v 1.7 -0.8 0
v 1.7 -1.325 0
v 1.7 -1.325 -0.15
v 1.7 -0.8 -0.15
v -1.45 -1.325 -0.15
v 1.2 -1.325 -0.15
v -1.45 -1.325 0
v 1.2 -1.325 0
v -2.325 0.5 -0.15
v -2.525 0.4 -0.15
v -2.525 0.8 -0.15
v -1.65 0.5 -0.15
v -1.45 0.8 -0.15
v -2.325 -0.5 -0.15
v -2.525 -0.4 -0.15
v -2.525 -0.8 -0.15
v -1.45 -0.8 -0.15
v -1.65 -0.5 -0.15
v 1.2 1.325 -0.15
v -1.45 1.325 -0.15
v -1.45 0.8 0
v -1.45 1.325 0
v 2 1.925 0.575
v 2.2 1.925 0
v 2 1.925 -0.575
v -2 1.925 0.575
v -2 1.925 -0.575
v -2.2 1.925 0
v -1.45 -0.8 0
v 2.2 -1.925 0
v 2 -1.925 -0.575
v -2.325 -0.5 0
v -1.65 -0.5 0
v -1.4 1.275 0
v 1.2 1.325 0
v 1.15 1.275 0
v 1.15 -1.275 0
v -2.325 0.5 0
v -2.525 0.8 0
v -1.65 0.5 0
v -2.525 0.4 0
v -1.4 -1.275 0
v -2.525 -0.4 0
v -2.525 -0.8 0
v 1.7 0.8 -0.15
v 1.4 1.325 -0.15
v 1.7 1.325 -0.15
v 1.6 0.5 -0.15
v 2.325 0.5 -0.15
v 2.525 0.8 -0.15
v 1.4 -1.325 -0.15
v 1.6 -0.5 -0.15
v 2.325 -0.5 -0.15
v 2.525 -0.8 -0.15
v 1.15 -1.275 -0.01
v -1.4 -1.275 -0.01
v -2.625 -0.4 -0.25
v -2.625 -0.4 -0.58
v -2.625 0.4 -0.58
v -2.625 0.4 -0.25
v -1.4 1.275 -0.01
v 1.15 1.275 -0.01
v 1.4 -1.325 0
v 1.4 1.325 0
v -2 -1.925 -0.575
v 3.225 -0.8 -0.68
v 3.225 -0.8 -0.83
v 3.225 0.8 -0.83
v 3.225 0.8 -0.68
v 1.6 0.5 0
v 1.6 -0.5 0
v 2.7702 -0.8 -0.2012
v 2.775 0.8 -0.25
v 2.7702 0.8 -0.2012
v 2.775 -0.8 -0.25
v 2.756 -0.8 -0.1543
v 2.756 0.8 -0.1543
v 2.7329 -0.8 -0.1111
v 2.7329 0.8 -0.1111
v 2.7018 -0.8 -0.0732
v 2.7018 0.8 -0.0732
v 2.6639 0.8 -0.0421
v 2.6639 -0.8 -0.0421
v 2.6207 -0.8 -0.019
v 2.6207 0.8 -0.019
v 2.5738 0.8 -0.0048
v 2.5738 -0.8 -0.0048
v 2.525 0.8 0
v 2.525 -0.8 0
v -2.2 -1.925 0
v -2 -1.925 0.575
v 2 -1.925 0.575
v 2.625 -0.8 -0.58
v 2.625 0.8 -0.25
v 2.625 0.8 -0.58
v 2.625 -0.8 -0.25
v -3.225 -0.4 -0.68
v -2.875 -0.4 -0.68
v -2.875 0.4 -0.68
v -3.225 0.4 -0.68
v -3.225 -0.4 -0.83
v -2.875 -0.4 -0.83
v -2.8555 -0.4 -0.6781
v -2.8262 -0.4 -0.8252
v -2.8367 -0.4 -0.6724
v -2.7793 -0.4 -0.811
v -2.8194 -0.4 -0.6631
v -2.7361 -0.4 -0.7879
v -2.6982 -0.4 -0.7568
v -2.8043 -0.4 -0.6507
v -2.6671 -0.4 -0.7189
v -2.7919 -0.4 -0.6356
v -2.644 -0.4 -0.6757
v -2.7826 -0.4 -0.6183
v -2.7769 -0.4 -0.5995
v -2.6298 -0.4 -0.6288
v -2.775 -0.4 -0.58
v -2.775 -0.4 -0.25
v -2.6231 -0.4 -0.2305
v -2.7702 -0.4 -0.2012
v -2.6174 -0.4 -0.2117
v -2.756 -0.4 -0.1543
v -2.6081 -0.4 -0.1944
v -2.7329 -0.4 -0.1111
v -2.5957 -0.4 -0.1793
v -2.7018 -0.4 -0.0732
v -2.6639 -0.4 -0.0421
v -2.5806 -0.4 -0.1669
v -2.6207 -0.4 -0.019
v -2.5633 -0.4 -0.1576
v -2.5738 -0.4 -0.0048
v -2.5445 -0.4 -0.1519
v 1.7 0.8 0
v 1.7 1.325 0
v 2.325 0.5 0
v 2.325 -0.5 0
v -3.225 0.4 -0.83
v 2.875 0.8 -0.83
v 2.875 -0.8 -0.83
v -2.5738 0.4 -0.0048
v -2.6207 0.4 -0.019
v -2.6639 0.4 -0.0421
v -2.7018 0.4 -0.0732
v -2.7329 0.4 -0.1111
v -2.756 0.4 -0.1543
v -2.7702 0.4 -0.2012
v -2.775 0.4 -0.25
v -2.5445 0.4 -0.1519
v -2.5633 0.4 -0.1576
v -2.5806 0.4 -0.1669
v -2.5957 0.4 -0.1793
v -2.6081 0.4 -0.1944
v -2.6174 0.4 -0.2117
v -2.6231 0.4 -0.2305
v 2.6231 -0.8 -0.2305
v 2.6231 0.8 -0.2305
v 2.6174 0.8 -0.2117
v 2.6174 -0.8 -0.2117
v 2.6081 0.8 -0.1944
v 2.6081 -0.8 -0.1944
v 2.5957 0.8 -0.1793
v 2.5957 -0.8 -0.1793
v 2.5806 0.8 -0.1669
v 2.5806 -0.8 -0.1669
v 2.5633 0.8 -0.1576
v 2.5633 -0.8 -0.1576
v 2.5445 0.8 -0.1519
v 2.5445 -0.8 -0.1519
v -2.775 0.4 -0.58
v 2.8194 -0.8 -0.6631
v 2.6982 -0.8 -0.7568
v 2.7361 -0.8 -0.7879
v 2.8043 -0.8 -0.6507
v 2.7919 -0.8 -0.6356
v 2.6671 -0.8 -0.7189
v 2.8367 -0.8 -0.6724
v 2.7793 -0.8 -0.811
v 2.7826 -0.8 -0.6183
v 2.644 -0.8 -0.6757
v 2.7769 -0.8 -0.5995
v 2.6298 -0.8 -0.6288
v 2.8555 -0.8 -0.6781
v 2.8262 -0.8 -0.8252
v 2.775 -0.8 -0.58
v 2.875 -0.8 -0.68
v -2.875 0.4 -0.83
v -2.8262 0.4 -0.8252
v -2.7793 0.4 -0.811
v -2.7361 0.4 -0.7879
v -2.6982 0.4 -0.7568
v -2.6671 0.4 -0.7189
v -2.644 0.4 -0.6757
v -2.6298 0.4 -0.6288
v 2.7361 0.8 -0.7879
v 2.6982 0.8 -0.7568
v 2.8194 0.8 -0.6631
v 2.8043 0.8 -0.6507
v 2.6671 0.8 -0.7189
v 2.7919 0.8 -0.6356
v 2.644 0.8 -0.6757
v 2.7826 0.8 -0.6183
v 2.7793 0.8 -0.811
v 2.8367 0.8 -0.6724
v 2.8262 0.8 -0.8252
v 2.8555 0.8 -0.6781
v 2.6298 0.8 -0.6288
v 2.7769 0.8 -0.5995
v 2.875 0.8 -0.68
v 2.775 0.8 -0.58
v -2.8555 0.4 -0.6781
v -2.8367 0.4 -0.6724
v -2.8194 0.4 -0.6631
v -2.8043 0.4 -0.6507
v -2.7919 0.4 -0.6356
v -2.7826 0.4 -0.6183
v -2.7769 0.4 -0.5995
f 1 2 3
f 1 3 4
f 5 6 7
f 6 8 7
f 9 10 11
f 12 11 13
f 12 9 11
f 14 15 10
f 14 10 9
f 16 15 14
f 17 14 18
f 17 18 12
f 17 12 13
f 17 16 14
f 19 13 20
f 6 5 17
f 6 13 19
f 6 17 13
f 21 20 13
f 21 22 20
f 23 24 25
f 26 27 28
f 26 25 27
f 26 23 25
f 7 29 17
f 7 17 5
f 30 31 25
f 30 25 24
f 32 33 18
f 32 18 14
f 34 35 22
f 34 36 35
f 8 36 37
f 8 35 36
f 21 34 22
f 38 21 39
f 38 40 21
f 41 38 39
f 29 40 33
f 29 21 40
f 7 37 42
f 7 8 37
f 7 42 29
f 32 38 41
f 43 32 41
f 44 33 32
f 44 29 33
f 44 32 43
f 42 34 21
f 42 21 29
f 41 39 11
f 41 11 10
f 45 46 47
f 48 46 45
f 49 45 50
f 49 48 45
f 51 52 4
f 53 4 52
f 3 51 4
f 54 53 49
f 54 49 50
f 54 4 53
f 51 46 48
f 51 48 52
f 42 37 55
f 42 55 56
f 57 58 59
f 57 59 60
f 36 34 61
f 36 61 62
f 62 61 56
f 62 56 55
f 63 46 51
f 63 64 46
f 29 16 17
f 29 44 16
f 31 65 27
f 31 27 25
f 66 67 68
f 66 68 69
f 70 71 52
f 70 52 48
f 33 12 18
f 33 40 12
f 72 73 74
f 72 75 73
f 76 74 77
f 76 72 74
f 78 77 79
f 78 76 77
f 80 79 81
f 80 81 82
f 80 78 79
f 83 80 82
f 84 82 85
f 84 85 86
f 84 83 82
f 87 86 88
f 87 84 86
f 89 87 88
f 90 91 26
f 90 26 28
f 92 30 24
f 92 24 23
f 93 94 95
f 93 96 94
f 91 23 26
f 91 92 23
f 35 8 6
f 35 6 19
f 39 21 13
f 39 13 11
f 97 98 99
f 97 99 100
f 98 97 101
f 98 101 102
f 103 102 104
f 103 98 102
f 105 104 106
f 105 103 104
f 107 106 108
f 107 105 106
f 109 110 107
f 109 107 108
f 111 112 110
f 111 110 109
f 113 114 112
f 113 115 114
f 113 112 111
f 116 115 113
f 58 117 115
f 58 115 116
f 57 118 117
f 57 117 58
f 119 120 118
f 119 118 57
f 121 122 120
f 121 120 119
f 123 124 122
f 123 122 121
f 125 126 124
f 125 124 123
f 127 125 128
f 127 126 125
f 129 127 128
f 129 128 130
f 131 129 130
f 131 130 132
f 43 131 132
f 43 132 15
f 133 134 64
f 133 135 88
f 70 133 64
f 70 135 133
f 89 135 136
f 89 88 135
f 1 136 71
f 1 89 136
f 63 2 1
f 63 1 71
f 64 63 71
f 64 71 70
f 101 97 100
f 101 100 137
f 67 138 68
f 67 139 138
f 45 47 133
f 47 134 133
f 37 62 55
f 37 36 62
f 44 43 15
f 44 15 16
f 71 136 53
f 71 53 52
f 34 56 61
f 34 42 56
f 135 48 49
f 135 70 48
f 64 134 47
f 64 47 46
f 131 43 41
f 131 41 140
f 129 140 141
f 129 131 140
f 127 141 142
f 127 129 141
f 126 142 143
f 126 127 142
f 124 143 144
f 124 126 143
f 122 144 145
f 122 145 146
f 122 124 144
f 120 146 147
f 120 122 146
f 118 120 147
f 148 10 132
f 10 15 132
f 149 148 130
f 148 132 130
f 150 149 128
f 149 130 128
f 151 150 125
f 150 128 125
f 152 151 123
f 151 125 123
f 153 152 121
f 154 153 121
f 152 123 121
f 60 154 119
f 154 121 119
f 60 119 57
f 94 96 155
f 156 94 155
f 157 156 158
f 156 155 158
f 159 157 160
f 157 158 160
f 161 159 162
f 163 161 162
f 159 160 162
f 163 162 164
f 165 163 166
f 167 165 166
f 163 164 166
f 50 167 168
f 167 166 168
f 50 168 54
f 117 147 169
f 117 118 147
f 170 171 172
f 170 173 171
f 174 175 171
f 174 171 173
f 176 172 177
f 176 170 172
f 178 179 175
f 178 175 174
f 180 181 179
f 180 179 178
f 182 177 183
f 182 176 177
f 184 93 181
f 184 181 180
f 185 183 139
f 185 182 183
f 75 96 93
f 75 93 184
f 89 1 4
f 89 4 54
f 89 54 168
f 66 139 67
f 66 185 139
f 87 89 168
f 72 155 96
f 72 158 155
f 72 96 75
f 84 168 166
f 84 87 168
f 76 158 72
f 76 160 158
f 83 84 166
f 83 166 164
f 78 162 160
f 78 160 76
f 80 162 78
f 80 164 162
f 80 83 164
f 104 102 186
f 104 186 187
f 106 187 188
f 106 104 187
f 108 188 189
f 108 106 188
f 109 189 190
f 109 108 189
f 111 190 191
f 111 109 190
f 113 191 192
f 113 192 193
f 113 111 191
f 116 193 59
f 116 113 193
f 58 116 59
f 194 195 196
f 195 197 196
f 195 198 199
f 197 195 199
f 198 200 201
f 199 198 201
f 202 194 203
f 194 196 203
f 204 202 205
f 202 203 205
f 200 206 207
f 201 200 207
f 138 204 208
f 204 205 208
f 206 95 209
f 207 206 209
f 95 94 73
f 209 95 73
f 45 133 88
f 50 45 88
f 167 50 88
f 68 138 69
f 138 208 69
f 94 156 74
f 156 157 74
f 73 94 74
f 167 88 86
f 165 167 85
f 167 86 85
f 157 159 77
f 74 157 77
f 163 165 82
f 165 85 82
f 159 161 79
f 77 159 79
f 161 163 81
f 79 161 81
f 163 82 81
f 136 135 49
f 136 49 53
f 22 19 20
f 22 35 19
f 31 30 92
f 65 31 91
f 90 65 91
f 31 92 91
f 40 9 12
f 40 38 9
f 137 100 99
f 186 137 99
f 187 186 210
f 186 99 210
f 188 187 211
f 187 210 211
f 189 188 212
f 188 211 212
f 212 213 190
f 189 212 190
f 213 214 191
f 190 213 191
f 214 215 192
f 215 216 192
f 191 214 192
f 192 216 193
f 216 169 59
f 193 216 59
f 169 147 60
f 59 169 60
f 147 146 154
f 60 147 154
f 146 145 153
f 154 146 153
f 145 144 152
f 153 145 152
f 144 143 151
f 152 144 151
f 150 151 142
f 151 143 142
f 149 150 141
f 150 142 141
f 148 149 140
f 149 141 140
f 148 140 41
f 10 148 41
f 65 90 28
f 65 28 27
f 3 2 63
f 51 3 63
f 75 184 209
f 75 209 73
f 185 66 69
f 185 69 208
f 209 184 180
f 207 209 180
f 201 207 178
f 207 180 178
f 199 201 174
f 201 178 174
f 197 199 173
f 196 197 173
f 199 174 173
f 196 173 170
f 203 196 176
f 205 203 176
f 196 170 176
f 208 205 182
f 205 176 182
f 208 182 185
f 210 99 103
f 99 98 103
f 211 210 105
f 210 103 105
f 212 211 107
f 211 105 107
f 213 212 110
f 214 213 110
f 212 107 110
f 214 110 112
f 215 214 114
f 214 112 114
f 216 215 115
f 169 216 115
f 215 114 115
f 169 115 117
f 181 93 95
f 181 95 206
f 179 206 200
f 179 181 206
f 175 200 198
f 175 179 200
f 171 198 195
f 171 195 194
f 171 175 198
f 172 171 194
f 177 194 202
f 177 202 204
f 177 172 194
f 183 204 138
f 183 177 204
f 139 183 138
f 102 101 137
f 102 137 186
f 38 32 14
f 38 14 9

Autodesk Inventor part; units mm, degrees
ref_plane "YZ Plane" through (0, 0, 0) normal (1, 0, 0) x (0, 1, 0)
ref_plane "XZ Plane" through (0, 0, 0) normal (0, 1, 0) x (-1, 0, 0)
ref_plane "XY Plane" through (0, 0, 0) normal (0, 0, 1) x (1, 0, 0)
sketch "Sketch2" plane through (0, 0, 0) normal (0, 1, 0) x (-1, 0, 0)
  line L0 (3.225, -0.83) -> (2.875, -0.83)
  arc A0 (2.625, -0.58) -> (2.875, -0.83) centre (2.875, -0.58) ccw
  line L1 (2.625, -0.58) -> (2.625, -0.25)
  arc A1 (2.625, -0.25) -> (2.525, -0.15) centre (2.525, -0.25) ccw
  line L2 (2.525, -0.15) -> (-2.525, -0.15)
  arc A2 (-2.525, -0.15) -> (-2.625, -0.25) centre (-2.525, -0.25) ccw
  line L3 (-2.625, -0.25) -> (-2.625, -0.58)
  arc A3 (-2.875, -0.83) -> (-2.625, -0.58) centre (-2.875, -0.58) ccw
  line L4 (-2.875, -0.83) -> (-3.225, -0.83)
  line L5 (-3.225, -0.83) -> (-3.225, -0.68)
  line L6 (-3.225, -0.68) -> (-2.875, -0.68)
  arc A4 (-2.875, -0.68) -> (-2.775, -0.58) centre (-2.875, -0.58) ccw
  line L7 (-2.775, -0.58) -> (-2.775, -0.25)
  arc A5 (-2.525, 0) -> (-2.775, -0.25) centre (-2.525, -0.25) ccw
  line L8 (-2.525, 0) -> (2.525, 0)
  arc A6 (2.775, -0.25) -> (2.525, 0) centre (2.525, -0.25) ccw
  line L9 (2.775, -0.25) -> (2.775, -0.58)
  arc A7 (2.775, -0.58) -> (2.875, -0.68) centre (2.875, -0.58) ccw
  line L10 (2.875, -0.68) -> (3.225, -0.68)
  line L11 (3.225, -0.68) -> (3.225, -0.83)
  point P0 (0, 0)
  point P1 (0, 0)
  point P2 (0, 0)
  dimension "d5" = 0.15
  dimension "d6" = 6.45
  dimension "d7" = 0.83
  dimension "d8" = 0.1
  dimension "d9" = 0.7
extrude "Extrusion2" add sketch "Sketch2" along normal mid plane 2.65
sketch "Sketch3" plane through (-2.525, 1.325, 0) normal (0, 0, 1) x (1, 0, 0)
  line L0 (-0.35, 0) -> (-0.35, -2.65)
  line L1 (-0.7, 0) -> (-0.35, 0)
  line L2 (-0.7, 0) -> (-0.7, -2.65)
  line L3 (-0.35, -2.65) -> (-0.7, -2.65)
  line L4 (-0.25, 0) -> (-0.25, -2.65)
  line L5 (-0.35, 0) -> (-0.25, 0)
  line L6 (-0.35, 0) -> (-0.35, -2.65)
  line L7 (-0.25, -2.65) -> (-0.35, -2.65)
  line L8 (0, 0) -> (0, -2.65)
  line L9 (-0.25, 0) -> (0, 0)
  line L10 (-0.25, 0) -> (-0.25, -2.65)
  line L11 (0, -2.65) -> (-0.25, -2.65)
  line L12 (5.05, 0) -> (5.05, -2.65)
  line L13 (0, 0) -> (5.05, 0)
  line L14 (0, 0) -> (0, -2.65)
  line L15 (5.05, -2.65) -> (0, -2.65)
  line L16 (5.75, 0) -> (5.75, -2.65)
  line L17 (5.4, 0) -> (5.75, 0)
  line L18 (5.4, 0) -> (5.4, -2.65)
  line L19 (5.75, -2.65) -> (5.4, -2.65)
  line L20 (5.4, 0) -> (5.4, -2.65)
  line L21 (5.3, 0) -> (5.4, 0)
  line L22 (5.3, 0) -> (5.3, -2.65)
  line L23 (5.4, -2.65) -> (5.3, -2.65)
  line L24 (5.3, 0) -> (5.3, -2.65)
  line L25 (5.05, 0) -> (5.3, 0)
  line L26 (5.05, 0) -> (5.05, -2.65)
  line L27 (5.3, -2.65) -> (5.05, -2.65)
  line L28 (-0.7, 0) -> (-0.7, -2.65)
  line L29 (-0.7, -0.925) -> (-0.35, -0.925)
  line L30 (-0.35, 0) -> (-0.35, -2.65)
  line L31 (-0.7, -1.725) -> (-0.35, -1.725)
  line L32 (-0.7, -0.925) -> (-0.7, -1.725)
  line L33 (1.075, 0) -> (1.075, -0.525)
  line L34 (1.075, -0.525) -> (0, -0.525)
  line L35 (0, -2.125) -> (1.075, -2.125)
  line L36 (1.075, -2.125) -> (1.075, -2.65)
  line L37 (0, -2.65) -> (5.05, -2.65)
  line L38 (3.725, -2.65) -> (3.725, 0)
  line L39 (0, 0) -> (5.05, 0)
  line L40 (3.925, 0) -> (3.925, -2.65)
  line L41 (4.225, -2.65) -> (4.225, -2.125)
  line L42 (4.225, -2.125) -> (5.75, -2.125)
  line L43 (4.225, 0) -> (4.225, -0.525)
  line L44 (4.225, -0.525) -> (5.75, -0.525)
  line L45 (5.75, -0.525) -> (5.75, -2.125)
  line L46 (5.75, 0) -> (5.75, -2.65)
  line L47 (0, -0.525) -> (0, -2.125)
  line L48 (-0.35, -0.925) -> (0, -0.925)
  line L49 (-0.35, -1.725) -> (0, -1.725)
  point P0 (2.525, -1.325)
  point P1 (5.75, -1.325)
  point P2 (-0.7, -1.325)
extrude "Extrusion4" cut sketch "Sketch3" against normal through all contours L48 L4 L49 L0 | L0 L31 L2 L29 | L48 L8 L49 L4 | L8 L34 L33 L13 L38 L15 L36 L35 | L13 L43 L44 L12 L42 L41 L15 L40 | L44 L22 L42 L12 | L44 L18 L42 L22 | L44 L16 L42 L18 keep common part
sketch "Sketch4" plane through (-1.45, -1.325, 0) normal (0, 0, 1) x (1, 0, 0)
  line L0 (0, 2.125) -> (0, 2.65) projected
  line L1 (-1.075, 2.125) -> (0, 2.125) projected
  line L2 (-1.075, 2.125) -> (-1.075, 1.725) projected
  line L3 (-1.075, 1.725) -> (-1.075, 0.925) projected
  line L4 (-1.075, 0.925) -> (-1.075, 0.525) projected
  line L5 (0, 0.525) -> (-1.075, 0.525) projected
  line L6 (0, 0) -> (0, 0.525) projected
  line L7 (2.65, 0) -> (0, 0) projected
  line L8 (2.65, 2.65) -> (2.65, 0) projected
  line L9 (0, 2.65) -> (2.65, 2.65) projected
  line L10 (0.05, 2.6) -> (2.6, 2.6)
  line L11 (2.6, 2.6) -> (2.6, 0.05)
  line L12 (2.6, 0.05) -> (0.05, 0.05)
  line L13 (0.05, 0.05) -> (0.05, 2.6)
  point P0 (1.45, 1.325)
  point P1 (1.325, 2.6)
  point P2 (1.325, 2.65)
  point P3 (2.6, 1.325)
  point P4 (2.65, 1.325)
  dimension "d22" = 0.05
  dimension "d23" = 0.05
extrude "Extrusion5" cut sketch "Sketch4" against normal blind 0.01 contours L10 L11 L12 L13
sketch "Sketch5" plane through (-1.45, -1.325, 0) normal (0, 0, 1) x (1, 0, 0)
  line L0 (0.05, 0.05) -> (0.05, 2.6) projected
  line L1 (0.05, 2.6) -> (2.6, 2.6) projected
  line L2 (2.6, 2.6) -> (2.6, 0.05) projected
  line L3 (2.6, 0.05) -> (0.05, 0.05) projected
  line L4 (0, 2.125) -> (0, 2.65) projected
  line L5 (-1.075, 2.125) -> (0, 2.125) projected
  line L6 (-1.075, 2.125) -> (-1.075, 1.725) projected
  line L7 (-1.075, 1.725) -> (-1.075, 0.925) projected
  line L8 (-1.075, 0.925) -> (-1.075, 0.525) projected
  line L9 (0, 0.525) -> (-1.075, 0.525) projected
  line L10 (0, 0) -> (0, 0.525) projected
  line L11 (2.65, 0) -> (0, 0) projected
  line L12 (2.65, 2.65) -> (2.65, 0) projected
  line L13 (0, 2.65) -> (2.65, 2.65) projected
  line L14 (3.975, 0.525) -> (3.15, 0.525) projected
  line L15 (3.975, 2.125) -> (3.975, 0.525) projected
  line L16 (3.15, 2.125) -> (3.975, 2.125) projected
  line L17 (3.15, 2.65) -> (3.15, 2.125) projected
  line L18 (2.85, 2.65) -> (3.15, 2.65) projected
  line L19 (2.85, 0) -> (2.85, 2.65) projected
  line L20 (3.15, 0) -> (2.85, 0) projected
  line L21 (3.15, 0.525) -> (3.15, 0) projected
  line L22 (-0.875, 1.825) -> (-0.2, 1.825)
  line L23 (-0.2, 1.825) -> (-0.2, 0.825)
  line L24 (-0.2, 0.825) -> (-0.875, 0.825)
  line L25 (-0.875, 0.825) -> (-0.875, 1.825)
  line L26 (3.05, 1.825) -> (3.775, 1.825)
  line L27 (3.775, 1.825) -> (3.775, 0.825)
  line L28 (3.775, 0.825) -> (3.05, 0.825)
  line L29 (3.05, 0.825) -> (3.05, 1.825)
  point P0 (1.45, 1.325)
  point P1 (-0.5375, 2.125)
  point P2 (-0.5375, 1.825)
  point P3 (-0.2, 1.325)
  dimension "d26" = 0.3
  dimension "d27" = 0.2
  dimension "d28" = 0.2
  dimension "d29" = 0.2
extrude "Extrusion6" cut sketch "Sketch5" against normal through all contours L22 L23 L24 L25 | L26 L27 L28 L29
sketch "Sketch1" plane through (0, 0, 0) normal (0, 1, 0) x (-1, 0, 0)
  line L0 (2, 0.575) -> (2.2, 0)
  line L1 (2.2, 0) -> (2, -0.575)
  line L2 (2, -0.575) -> (-2, -0.575)
  line L3 (-2, -0.575) -> (-2.2, 0)
  line L4 (-2.2, 0) -> (-2, 0.575)
  line L5 (-2, 0.575) -> (2, 0.575)
  point P0 (0, 0)
  point P1 (0, 0.575)
  point P2 (0, -0.575)
  dimension "d0" = 1.15
  dimension "d1" = 4.4
  dimension "d2" = 4
extrude "Extrusion1" add sketch "Sketch1" along normal mid plane 3.85 separate body
equation "\"d23\" = d22"
equation "\"d28\" = d27"
equation "\"d29\" = d28"
properties part number "Photodiode_SFH2430" material "Silver"
